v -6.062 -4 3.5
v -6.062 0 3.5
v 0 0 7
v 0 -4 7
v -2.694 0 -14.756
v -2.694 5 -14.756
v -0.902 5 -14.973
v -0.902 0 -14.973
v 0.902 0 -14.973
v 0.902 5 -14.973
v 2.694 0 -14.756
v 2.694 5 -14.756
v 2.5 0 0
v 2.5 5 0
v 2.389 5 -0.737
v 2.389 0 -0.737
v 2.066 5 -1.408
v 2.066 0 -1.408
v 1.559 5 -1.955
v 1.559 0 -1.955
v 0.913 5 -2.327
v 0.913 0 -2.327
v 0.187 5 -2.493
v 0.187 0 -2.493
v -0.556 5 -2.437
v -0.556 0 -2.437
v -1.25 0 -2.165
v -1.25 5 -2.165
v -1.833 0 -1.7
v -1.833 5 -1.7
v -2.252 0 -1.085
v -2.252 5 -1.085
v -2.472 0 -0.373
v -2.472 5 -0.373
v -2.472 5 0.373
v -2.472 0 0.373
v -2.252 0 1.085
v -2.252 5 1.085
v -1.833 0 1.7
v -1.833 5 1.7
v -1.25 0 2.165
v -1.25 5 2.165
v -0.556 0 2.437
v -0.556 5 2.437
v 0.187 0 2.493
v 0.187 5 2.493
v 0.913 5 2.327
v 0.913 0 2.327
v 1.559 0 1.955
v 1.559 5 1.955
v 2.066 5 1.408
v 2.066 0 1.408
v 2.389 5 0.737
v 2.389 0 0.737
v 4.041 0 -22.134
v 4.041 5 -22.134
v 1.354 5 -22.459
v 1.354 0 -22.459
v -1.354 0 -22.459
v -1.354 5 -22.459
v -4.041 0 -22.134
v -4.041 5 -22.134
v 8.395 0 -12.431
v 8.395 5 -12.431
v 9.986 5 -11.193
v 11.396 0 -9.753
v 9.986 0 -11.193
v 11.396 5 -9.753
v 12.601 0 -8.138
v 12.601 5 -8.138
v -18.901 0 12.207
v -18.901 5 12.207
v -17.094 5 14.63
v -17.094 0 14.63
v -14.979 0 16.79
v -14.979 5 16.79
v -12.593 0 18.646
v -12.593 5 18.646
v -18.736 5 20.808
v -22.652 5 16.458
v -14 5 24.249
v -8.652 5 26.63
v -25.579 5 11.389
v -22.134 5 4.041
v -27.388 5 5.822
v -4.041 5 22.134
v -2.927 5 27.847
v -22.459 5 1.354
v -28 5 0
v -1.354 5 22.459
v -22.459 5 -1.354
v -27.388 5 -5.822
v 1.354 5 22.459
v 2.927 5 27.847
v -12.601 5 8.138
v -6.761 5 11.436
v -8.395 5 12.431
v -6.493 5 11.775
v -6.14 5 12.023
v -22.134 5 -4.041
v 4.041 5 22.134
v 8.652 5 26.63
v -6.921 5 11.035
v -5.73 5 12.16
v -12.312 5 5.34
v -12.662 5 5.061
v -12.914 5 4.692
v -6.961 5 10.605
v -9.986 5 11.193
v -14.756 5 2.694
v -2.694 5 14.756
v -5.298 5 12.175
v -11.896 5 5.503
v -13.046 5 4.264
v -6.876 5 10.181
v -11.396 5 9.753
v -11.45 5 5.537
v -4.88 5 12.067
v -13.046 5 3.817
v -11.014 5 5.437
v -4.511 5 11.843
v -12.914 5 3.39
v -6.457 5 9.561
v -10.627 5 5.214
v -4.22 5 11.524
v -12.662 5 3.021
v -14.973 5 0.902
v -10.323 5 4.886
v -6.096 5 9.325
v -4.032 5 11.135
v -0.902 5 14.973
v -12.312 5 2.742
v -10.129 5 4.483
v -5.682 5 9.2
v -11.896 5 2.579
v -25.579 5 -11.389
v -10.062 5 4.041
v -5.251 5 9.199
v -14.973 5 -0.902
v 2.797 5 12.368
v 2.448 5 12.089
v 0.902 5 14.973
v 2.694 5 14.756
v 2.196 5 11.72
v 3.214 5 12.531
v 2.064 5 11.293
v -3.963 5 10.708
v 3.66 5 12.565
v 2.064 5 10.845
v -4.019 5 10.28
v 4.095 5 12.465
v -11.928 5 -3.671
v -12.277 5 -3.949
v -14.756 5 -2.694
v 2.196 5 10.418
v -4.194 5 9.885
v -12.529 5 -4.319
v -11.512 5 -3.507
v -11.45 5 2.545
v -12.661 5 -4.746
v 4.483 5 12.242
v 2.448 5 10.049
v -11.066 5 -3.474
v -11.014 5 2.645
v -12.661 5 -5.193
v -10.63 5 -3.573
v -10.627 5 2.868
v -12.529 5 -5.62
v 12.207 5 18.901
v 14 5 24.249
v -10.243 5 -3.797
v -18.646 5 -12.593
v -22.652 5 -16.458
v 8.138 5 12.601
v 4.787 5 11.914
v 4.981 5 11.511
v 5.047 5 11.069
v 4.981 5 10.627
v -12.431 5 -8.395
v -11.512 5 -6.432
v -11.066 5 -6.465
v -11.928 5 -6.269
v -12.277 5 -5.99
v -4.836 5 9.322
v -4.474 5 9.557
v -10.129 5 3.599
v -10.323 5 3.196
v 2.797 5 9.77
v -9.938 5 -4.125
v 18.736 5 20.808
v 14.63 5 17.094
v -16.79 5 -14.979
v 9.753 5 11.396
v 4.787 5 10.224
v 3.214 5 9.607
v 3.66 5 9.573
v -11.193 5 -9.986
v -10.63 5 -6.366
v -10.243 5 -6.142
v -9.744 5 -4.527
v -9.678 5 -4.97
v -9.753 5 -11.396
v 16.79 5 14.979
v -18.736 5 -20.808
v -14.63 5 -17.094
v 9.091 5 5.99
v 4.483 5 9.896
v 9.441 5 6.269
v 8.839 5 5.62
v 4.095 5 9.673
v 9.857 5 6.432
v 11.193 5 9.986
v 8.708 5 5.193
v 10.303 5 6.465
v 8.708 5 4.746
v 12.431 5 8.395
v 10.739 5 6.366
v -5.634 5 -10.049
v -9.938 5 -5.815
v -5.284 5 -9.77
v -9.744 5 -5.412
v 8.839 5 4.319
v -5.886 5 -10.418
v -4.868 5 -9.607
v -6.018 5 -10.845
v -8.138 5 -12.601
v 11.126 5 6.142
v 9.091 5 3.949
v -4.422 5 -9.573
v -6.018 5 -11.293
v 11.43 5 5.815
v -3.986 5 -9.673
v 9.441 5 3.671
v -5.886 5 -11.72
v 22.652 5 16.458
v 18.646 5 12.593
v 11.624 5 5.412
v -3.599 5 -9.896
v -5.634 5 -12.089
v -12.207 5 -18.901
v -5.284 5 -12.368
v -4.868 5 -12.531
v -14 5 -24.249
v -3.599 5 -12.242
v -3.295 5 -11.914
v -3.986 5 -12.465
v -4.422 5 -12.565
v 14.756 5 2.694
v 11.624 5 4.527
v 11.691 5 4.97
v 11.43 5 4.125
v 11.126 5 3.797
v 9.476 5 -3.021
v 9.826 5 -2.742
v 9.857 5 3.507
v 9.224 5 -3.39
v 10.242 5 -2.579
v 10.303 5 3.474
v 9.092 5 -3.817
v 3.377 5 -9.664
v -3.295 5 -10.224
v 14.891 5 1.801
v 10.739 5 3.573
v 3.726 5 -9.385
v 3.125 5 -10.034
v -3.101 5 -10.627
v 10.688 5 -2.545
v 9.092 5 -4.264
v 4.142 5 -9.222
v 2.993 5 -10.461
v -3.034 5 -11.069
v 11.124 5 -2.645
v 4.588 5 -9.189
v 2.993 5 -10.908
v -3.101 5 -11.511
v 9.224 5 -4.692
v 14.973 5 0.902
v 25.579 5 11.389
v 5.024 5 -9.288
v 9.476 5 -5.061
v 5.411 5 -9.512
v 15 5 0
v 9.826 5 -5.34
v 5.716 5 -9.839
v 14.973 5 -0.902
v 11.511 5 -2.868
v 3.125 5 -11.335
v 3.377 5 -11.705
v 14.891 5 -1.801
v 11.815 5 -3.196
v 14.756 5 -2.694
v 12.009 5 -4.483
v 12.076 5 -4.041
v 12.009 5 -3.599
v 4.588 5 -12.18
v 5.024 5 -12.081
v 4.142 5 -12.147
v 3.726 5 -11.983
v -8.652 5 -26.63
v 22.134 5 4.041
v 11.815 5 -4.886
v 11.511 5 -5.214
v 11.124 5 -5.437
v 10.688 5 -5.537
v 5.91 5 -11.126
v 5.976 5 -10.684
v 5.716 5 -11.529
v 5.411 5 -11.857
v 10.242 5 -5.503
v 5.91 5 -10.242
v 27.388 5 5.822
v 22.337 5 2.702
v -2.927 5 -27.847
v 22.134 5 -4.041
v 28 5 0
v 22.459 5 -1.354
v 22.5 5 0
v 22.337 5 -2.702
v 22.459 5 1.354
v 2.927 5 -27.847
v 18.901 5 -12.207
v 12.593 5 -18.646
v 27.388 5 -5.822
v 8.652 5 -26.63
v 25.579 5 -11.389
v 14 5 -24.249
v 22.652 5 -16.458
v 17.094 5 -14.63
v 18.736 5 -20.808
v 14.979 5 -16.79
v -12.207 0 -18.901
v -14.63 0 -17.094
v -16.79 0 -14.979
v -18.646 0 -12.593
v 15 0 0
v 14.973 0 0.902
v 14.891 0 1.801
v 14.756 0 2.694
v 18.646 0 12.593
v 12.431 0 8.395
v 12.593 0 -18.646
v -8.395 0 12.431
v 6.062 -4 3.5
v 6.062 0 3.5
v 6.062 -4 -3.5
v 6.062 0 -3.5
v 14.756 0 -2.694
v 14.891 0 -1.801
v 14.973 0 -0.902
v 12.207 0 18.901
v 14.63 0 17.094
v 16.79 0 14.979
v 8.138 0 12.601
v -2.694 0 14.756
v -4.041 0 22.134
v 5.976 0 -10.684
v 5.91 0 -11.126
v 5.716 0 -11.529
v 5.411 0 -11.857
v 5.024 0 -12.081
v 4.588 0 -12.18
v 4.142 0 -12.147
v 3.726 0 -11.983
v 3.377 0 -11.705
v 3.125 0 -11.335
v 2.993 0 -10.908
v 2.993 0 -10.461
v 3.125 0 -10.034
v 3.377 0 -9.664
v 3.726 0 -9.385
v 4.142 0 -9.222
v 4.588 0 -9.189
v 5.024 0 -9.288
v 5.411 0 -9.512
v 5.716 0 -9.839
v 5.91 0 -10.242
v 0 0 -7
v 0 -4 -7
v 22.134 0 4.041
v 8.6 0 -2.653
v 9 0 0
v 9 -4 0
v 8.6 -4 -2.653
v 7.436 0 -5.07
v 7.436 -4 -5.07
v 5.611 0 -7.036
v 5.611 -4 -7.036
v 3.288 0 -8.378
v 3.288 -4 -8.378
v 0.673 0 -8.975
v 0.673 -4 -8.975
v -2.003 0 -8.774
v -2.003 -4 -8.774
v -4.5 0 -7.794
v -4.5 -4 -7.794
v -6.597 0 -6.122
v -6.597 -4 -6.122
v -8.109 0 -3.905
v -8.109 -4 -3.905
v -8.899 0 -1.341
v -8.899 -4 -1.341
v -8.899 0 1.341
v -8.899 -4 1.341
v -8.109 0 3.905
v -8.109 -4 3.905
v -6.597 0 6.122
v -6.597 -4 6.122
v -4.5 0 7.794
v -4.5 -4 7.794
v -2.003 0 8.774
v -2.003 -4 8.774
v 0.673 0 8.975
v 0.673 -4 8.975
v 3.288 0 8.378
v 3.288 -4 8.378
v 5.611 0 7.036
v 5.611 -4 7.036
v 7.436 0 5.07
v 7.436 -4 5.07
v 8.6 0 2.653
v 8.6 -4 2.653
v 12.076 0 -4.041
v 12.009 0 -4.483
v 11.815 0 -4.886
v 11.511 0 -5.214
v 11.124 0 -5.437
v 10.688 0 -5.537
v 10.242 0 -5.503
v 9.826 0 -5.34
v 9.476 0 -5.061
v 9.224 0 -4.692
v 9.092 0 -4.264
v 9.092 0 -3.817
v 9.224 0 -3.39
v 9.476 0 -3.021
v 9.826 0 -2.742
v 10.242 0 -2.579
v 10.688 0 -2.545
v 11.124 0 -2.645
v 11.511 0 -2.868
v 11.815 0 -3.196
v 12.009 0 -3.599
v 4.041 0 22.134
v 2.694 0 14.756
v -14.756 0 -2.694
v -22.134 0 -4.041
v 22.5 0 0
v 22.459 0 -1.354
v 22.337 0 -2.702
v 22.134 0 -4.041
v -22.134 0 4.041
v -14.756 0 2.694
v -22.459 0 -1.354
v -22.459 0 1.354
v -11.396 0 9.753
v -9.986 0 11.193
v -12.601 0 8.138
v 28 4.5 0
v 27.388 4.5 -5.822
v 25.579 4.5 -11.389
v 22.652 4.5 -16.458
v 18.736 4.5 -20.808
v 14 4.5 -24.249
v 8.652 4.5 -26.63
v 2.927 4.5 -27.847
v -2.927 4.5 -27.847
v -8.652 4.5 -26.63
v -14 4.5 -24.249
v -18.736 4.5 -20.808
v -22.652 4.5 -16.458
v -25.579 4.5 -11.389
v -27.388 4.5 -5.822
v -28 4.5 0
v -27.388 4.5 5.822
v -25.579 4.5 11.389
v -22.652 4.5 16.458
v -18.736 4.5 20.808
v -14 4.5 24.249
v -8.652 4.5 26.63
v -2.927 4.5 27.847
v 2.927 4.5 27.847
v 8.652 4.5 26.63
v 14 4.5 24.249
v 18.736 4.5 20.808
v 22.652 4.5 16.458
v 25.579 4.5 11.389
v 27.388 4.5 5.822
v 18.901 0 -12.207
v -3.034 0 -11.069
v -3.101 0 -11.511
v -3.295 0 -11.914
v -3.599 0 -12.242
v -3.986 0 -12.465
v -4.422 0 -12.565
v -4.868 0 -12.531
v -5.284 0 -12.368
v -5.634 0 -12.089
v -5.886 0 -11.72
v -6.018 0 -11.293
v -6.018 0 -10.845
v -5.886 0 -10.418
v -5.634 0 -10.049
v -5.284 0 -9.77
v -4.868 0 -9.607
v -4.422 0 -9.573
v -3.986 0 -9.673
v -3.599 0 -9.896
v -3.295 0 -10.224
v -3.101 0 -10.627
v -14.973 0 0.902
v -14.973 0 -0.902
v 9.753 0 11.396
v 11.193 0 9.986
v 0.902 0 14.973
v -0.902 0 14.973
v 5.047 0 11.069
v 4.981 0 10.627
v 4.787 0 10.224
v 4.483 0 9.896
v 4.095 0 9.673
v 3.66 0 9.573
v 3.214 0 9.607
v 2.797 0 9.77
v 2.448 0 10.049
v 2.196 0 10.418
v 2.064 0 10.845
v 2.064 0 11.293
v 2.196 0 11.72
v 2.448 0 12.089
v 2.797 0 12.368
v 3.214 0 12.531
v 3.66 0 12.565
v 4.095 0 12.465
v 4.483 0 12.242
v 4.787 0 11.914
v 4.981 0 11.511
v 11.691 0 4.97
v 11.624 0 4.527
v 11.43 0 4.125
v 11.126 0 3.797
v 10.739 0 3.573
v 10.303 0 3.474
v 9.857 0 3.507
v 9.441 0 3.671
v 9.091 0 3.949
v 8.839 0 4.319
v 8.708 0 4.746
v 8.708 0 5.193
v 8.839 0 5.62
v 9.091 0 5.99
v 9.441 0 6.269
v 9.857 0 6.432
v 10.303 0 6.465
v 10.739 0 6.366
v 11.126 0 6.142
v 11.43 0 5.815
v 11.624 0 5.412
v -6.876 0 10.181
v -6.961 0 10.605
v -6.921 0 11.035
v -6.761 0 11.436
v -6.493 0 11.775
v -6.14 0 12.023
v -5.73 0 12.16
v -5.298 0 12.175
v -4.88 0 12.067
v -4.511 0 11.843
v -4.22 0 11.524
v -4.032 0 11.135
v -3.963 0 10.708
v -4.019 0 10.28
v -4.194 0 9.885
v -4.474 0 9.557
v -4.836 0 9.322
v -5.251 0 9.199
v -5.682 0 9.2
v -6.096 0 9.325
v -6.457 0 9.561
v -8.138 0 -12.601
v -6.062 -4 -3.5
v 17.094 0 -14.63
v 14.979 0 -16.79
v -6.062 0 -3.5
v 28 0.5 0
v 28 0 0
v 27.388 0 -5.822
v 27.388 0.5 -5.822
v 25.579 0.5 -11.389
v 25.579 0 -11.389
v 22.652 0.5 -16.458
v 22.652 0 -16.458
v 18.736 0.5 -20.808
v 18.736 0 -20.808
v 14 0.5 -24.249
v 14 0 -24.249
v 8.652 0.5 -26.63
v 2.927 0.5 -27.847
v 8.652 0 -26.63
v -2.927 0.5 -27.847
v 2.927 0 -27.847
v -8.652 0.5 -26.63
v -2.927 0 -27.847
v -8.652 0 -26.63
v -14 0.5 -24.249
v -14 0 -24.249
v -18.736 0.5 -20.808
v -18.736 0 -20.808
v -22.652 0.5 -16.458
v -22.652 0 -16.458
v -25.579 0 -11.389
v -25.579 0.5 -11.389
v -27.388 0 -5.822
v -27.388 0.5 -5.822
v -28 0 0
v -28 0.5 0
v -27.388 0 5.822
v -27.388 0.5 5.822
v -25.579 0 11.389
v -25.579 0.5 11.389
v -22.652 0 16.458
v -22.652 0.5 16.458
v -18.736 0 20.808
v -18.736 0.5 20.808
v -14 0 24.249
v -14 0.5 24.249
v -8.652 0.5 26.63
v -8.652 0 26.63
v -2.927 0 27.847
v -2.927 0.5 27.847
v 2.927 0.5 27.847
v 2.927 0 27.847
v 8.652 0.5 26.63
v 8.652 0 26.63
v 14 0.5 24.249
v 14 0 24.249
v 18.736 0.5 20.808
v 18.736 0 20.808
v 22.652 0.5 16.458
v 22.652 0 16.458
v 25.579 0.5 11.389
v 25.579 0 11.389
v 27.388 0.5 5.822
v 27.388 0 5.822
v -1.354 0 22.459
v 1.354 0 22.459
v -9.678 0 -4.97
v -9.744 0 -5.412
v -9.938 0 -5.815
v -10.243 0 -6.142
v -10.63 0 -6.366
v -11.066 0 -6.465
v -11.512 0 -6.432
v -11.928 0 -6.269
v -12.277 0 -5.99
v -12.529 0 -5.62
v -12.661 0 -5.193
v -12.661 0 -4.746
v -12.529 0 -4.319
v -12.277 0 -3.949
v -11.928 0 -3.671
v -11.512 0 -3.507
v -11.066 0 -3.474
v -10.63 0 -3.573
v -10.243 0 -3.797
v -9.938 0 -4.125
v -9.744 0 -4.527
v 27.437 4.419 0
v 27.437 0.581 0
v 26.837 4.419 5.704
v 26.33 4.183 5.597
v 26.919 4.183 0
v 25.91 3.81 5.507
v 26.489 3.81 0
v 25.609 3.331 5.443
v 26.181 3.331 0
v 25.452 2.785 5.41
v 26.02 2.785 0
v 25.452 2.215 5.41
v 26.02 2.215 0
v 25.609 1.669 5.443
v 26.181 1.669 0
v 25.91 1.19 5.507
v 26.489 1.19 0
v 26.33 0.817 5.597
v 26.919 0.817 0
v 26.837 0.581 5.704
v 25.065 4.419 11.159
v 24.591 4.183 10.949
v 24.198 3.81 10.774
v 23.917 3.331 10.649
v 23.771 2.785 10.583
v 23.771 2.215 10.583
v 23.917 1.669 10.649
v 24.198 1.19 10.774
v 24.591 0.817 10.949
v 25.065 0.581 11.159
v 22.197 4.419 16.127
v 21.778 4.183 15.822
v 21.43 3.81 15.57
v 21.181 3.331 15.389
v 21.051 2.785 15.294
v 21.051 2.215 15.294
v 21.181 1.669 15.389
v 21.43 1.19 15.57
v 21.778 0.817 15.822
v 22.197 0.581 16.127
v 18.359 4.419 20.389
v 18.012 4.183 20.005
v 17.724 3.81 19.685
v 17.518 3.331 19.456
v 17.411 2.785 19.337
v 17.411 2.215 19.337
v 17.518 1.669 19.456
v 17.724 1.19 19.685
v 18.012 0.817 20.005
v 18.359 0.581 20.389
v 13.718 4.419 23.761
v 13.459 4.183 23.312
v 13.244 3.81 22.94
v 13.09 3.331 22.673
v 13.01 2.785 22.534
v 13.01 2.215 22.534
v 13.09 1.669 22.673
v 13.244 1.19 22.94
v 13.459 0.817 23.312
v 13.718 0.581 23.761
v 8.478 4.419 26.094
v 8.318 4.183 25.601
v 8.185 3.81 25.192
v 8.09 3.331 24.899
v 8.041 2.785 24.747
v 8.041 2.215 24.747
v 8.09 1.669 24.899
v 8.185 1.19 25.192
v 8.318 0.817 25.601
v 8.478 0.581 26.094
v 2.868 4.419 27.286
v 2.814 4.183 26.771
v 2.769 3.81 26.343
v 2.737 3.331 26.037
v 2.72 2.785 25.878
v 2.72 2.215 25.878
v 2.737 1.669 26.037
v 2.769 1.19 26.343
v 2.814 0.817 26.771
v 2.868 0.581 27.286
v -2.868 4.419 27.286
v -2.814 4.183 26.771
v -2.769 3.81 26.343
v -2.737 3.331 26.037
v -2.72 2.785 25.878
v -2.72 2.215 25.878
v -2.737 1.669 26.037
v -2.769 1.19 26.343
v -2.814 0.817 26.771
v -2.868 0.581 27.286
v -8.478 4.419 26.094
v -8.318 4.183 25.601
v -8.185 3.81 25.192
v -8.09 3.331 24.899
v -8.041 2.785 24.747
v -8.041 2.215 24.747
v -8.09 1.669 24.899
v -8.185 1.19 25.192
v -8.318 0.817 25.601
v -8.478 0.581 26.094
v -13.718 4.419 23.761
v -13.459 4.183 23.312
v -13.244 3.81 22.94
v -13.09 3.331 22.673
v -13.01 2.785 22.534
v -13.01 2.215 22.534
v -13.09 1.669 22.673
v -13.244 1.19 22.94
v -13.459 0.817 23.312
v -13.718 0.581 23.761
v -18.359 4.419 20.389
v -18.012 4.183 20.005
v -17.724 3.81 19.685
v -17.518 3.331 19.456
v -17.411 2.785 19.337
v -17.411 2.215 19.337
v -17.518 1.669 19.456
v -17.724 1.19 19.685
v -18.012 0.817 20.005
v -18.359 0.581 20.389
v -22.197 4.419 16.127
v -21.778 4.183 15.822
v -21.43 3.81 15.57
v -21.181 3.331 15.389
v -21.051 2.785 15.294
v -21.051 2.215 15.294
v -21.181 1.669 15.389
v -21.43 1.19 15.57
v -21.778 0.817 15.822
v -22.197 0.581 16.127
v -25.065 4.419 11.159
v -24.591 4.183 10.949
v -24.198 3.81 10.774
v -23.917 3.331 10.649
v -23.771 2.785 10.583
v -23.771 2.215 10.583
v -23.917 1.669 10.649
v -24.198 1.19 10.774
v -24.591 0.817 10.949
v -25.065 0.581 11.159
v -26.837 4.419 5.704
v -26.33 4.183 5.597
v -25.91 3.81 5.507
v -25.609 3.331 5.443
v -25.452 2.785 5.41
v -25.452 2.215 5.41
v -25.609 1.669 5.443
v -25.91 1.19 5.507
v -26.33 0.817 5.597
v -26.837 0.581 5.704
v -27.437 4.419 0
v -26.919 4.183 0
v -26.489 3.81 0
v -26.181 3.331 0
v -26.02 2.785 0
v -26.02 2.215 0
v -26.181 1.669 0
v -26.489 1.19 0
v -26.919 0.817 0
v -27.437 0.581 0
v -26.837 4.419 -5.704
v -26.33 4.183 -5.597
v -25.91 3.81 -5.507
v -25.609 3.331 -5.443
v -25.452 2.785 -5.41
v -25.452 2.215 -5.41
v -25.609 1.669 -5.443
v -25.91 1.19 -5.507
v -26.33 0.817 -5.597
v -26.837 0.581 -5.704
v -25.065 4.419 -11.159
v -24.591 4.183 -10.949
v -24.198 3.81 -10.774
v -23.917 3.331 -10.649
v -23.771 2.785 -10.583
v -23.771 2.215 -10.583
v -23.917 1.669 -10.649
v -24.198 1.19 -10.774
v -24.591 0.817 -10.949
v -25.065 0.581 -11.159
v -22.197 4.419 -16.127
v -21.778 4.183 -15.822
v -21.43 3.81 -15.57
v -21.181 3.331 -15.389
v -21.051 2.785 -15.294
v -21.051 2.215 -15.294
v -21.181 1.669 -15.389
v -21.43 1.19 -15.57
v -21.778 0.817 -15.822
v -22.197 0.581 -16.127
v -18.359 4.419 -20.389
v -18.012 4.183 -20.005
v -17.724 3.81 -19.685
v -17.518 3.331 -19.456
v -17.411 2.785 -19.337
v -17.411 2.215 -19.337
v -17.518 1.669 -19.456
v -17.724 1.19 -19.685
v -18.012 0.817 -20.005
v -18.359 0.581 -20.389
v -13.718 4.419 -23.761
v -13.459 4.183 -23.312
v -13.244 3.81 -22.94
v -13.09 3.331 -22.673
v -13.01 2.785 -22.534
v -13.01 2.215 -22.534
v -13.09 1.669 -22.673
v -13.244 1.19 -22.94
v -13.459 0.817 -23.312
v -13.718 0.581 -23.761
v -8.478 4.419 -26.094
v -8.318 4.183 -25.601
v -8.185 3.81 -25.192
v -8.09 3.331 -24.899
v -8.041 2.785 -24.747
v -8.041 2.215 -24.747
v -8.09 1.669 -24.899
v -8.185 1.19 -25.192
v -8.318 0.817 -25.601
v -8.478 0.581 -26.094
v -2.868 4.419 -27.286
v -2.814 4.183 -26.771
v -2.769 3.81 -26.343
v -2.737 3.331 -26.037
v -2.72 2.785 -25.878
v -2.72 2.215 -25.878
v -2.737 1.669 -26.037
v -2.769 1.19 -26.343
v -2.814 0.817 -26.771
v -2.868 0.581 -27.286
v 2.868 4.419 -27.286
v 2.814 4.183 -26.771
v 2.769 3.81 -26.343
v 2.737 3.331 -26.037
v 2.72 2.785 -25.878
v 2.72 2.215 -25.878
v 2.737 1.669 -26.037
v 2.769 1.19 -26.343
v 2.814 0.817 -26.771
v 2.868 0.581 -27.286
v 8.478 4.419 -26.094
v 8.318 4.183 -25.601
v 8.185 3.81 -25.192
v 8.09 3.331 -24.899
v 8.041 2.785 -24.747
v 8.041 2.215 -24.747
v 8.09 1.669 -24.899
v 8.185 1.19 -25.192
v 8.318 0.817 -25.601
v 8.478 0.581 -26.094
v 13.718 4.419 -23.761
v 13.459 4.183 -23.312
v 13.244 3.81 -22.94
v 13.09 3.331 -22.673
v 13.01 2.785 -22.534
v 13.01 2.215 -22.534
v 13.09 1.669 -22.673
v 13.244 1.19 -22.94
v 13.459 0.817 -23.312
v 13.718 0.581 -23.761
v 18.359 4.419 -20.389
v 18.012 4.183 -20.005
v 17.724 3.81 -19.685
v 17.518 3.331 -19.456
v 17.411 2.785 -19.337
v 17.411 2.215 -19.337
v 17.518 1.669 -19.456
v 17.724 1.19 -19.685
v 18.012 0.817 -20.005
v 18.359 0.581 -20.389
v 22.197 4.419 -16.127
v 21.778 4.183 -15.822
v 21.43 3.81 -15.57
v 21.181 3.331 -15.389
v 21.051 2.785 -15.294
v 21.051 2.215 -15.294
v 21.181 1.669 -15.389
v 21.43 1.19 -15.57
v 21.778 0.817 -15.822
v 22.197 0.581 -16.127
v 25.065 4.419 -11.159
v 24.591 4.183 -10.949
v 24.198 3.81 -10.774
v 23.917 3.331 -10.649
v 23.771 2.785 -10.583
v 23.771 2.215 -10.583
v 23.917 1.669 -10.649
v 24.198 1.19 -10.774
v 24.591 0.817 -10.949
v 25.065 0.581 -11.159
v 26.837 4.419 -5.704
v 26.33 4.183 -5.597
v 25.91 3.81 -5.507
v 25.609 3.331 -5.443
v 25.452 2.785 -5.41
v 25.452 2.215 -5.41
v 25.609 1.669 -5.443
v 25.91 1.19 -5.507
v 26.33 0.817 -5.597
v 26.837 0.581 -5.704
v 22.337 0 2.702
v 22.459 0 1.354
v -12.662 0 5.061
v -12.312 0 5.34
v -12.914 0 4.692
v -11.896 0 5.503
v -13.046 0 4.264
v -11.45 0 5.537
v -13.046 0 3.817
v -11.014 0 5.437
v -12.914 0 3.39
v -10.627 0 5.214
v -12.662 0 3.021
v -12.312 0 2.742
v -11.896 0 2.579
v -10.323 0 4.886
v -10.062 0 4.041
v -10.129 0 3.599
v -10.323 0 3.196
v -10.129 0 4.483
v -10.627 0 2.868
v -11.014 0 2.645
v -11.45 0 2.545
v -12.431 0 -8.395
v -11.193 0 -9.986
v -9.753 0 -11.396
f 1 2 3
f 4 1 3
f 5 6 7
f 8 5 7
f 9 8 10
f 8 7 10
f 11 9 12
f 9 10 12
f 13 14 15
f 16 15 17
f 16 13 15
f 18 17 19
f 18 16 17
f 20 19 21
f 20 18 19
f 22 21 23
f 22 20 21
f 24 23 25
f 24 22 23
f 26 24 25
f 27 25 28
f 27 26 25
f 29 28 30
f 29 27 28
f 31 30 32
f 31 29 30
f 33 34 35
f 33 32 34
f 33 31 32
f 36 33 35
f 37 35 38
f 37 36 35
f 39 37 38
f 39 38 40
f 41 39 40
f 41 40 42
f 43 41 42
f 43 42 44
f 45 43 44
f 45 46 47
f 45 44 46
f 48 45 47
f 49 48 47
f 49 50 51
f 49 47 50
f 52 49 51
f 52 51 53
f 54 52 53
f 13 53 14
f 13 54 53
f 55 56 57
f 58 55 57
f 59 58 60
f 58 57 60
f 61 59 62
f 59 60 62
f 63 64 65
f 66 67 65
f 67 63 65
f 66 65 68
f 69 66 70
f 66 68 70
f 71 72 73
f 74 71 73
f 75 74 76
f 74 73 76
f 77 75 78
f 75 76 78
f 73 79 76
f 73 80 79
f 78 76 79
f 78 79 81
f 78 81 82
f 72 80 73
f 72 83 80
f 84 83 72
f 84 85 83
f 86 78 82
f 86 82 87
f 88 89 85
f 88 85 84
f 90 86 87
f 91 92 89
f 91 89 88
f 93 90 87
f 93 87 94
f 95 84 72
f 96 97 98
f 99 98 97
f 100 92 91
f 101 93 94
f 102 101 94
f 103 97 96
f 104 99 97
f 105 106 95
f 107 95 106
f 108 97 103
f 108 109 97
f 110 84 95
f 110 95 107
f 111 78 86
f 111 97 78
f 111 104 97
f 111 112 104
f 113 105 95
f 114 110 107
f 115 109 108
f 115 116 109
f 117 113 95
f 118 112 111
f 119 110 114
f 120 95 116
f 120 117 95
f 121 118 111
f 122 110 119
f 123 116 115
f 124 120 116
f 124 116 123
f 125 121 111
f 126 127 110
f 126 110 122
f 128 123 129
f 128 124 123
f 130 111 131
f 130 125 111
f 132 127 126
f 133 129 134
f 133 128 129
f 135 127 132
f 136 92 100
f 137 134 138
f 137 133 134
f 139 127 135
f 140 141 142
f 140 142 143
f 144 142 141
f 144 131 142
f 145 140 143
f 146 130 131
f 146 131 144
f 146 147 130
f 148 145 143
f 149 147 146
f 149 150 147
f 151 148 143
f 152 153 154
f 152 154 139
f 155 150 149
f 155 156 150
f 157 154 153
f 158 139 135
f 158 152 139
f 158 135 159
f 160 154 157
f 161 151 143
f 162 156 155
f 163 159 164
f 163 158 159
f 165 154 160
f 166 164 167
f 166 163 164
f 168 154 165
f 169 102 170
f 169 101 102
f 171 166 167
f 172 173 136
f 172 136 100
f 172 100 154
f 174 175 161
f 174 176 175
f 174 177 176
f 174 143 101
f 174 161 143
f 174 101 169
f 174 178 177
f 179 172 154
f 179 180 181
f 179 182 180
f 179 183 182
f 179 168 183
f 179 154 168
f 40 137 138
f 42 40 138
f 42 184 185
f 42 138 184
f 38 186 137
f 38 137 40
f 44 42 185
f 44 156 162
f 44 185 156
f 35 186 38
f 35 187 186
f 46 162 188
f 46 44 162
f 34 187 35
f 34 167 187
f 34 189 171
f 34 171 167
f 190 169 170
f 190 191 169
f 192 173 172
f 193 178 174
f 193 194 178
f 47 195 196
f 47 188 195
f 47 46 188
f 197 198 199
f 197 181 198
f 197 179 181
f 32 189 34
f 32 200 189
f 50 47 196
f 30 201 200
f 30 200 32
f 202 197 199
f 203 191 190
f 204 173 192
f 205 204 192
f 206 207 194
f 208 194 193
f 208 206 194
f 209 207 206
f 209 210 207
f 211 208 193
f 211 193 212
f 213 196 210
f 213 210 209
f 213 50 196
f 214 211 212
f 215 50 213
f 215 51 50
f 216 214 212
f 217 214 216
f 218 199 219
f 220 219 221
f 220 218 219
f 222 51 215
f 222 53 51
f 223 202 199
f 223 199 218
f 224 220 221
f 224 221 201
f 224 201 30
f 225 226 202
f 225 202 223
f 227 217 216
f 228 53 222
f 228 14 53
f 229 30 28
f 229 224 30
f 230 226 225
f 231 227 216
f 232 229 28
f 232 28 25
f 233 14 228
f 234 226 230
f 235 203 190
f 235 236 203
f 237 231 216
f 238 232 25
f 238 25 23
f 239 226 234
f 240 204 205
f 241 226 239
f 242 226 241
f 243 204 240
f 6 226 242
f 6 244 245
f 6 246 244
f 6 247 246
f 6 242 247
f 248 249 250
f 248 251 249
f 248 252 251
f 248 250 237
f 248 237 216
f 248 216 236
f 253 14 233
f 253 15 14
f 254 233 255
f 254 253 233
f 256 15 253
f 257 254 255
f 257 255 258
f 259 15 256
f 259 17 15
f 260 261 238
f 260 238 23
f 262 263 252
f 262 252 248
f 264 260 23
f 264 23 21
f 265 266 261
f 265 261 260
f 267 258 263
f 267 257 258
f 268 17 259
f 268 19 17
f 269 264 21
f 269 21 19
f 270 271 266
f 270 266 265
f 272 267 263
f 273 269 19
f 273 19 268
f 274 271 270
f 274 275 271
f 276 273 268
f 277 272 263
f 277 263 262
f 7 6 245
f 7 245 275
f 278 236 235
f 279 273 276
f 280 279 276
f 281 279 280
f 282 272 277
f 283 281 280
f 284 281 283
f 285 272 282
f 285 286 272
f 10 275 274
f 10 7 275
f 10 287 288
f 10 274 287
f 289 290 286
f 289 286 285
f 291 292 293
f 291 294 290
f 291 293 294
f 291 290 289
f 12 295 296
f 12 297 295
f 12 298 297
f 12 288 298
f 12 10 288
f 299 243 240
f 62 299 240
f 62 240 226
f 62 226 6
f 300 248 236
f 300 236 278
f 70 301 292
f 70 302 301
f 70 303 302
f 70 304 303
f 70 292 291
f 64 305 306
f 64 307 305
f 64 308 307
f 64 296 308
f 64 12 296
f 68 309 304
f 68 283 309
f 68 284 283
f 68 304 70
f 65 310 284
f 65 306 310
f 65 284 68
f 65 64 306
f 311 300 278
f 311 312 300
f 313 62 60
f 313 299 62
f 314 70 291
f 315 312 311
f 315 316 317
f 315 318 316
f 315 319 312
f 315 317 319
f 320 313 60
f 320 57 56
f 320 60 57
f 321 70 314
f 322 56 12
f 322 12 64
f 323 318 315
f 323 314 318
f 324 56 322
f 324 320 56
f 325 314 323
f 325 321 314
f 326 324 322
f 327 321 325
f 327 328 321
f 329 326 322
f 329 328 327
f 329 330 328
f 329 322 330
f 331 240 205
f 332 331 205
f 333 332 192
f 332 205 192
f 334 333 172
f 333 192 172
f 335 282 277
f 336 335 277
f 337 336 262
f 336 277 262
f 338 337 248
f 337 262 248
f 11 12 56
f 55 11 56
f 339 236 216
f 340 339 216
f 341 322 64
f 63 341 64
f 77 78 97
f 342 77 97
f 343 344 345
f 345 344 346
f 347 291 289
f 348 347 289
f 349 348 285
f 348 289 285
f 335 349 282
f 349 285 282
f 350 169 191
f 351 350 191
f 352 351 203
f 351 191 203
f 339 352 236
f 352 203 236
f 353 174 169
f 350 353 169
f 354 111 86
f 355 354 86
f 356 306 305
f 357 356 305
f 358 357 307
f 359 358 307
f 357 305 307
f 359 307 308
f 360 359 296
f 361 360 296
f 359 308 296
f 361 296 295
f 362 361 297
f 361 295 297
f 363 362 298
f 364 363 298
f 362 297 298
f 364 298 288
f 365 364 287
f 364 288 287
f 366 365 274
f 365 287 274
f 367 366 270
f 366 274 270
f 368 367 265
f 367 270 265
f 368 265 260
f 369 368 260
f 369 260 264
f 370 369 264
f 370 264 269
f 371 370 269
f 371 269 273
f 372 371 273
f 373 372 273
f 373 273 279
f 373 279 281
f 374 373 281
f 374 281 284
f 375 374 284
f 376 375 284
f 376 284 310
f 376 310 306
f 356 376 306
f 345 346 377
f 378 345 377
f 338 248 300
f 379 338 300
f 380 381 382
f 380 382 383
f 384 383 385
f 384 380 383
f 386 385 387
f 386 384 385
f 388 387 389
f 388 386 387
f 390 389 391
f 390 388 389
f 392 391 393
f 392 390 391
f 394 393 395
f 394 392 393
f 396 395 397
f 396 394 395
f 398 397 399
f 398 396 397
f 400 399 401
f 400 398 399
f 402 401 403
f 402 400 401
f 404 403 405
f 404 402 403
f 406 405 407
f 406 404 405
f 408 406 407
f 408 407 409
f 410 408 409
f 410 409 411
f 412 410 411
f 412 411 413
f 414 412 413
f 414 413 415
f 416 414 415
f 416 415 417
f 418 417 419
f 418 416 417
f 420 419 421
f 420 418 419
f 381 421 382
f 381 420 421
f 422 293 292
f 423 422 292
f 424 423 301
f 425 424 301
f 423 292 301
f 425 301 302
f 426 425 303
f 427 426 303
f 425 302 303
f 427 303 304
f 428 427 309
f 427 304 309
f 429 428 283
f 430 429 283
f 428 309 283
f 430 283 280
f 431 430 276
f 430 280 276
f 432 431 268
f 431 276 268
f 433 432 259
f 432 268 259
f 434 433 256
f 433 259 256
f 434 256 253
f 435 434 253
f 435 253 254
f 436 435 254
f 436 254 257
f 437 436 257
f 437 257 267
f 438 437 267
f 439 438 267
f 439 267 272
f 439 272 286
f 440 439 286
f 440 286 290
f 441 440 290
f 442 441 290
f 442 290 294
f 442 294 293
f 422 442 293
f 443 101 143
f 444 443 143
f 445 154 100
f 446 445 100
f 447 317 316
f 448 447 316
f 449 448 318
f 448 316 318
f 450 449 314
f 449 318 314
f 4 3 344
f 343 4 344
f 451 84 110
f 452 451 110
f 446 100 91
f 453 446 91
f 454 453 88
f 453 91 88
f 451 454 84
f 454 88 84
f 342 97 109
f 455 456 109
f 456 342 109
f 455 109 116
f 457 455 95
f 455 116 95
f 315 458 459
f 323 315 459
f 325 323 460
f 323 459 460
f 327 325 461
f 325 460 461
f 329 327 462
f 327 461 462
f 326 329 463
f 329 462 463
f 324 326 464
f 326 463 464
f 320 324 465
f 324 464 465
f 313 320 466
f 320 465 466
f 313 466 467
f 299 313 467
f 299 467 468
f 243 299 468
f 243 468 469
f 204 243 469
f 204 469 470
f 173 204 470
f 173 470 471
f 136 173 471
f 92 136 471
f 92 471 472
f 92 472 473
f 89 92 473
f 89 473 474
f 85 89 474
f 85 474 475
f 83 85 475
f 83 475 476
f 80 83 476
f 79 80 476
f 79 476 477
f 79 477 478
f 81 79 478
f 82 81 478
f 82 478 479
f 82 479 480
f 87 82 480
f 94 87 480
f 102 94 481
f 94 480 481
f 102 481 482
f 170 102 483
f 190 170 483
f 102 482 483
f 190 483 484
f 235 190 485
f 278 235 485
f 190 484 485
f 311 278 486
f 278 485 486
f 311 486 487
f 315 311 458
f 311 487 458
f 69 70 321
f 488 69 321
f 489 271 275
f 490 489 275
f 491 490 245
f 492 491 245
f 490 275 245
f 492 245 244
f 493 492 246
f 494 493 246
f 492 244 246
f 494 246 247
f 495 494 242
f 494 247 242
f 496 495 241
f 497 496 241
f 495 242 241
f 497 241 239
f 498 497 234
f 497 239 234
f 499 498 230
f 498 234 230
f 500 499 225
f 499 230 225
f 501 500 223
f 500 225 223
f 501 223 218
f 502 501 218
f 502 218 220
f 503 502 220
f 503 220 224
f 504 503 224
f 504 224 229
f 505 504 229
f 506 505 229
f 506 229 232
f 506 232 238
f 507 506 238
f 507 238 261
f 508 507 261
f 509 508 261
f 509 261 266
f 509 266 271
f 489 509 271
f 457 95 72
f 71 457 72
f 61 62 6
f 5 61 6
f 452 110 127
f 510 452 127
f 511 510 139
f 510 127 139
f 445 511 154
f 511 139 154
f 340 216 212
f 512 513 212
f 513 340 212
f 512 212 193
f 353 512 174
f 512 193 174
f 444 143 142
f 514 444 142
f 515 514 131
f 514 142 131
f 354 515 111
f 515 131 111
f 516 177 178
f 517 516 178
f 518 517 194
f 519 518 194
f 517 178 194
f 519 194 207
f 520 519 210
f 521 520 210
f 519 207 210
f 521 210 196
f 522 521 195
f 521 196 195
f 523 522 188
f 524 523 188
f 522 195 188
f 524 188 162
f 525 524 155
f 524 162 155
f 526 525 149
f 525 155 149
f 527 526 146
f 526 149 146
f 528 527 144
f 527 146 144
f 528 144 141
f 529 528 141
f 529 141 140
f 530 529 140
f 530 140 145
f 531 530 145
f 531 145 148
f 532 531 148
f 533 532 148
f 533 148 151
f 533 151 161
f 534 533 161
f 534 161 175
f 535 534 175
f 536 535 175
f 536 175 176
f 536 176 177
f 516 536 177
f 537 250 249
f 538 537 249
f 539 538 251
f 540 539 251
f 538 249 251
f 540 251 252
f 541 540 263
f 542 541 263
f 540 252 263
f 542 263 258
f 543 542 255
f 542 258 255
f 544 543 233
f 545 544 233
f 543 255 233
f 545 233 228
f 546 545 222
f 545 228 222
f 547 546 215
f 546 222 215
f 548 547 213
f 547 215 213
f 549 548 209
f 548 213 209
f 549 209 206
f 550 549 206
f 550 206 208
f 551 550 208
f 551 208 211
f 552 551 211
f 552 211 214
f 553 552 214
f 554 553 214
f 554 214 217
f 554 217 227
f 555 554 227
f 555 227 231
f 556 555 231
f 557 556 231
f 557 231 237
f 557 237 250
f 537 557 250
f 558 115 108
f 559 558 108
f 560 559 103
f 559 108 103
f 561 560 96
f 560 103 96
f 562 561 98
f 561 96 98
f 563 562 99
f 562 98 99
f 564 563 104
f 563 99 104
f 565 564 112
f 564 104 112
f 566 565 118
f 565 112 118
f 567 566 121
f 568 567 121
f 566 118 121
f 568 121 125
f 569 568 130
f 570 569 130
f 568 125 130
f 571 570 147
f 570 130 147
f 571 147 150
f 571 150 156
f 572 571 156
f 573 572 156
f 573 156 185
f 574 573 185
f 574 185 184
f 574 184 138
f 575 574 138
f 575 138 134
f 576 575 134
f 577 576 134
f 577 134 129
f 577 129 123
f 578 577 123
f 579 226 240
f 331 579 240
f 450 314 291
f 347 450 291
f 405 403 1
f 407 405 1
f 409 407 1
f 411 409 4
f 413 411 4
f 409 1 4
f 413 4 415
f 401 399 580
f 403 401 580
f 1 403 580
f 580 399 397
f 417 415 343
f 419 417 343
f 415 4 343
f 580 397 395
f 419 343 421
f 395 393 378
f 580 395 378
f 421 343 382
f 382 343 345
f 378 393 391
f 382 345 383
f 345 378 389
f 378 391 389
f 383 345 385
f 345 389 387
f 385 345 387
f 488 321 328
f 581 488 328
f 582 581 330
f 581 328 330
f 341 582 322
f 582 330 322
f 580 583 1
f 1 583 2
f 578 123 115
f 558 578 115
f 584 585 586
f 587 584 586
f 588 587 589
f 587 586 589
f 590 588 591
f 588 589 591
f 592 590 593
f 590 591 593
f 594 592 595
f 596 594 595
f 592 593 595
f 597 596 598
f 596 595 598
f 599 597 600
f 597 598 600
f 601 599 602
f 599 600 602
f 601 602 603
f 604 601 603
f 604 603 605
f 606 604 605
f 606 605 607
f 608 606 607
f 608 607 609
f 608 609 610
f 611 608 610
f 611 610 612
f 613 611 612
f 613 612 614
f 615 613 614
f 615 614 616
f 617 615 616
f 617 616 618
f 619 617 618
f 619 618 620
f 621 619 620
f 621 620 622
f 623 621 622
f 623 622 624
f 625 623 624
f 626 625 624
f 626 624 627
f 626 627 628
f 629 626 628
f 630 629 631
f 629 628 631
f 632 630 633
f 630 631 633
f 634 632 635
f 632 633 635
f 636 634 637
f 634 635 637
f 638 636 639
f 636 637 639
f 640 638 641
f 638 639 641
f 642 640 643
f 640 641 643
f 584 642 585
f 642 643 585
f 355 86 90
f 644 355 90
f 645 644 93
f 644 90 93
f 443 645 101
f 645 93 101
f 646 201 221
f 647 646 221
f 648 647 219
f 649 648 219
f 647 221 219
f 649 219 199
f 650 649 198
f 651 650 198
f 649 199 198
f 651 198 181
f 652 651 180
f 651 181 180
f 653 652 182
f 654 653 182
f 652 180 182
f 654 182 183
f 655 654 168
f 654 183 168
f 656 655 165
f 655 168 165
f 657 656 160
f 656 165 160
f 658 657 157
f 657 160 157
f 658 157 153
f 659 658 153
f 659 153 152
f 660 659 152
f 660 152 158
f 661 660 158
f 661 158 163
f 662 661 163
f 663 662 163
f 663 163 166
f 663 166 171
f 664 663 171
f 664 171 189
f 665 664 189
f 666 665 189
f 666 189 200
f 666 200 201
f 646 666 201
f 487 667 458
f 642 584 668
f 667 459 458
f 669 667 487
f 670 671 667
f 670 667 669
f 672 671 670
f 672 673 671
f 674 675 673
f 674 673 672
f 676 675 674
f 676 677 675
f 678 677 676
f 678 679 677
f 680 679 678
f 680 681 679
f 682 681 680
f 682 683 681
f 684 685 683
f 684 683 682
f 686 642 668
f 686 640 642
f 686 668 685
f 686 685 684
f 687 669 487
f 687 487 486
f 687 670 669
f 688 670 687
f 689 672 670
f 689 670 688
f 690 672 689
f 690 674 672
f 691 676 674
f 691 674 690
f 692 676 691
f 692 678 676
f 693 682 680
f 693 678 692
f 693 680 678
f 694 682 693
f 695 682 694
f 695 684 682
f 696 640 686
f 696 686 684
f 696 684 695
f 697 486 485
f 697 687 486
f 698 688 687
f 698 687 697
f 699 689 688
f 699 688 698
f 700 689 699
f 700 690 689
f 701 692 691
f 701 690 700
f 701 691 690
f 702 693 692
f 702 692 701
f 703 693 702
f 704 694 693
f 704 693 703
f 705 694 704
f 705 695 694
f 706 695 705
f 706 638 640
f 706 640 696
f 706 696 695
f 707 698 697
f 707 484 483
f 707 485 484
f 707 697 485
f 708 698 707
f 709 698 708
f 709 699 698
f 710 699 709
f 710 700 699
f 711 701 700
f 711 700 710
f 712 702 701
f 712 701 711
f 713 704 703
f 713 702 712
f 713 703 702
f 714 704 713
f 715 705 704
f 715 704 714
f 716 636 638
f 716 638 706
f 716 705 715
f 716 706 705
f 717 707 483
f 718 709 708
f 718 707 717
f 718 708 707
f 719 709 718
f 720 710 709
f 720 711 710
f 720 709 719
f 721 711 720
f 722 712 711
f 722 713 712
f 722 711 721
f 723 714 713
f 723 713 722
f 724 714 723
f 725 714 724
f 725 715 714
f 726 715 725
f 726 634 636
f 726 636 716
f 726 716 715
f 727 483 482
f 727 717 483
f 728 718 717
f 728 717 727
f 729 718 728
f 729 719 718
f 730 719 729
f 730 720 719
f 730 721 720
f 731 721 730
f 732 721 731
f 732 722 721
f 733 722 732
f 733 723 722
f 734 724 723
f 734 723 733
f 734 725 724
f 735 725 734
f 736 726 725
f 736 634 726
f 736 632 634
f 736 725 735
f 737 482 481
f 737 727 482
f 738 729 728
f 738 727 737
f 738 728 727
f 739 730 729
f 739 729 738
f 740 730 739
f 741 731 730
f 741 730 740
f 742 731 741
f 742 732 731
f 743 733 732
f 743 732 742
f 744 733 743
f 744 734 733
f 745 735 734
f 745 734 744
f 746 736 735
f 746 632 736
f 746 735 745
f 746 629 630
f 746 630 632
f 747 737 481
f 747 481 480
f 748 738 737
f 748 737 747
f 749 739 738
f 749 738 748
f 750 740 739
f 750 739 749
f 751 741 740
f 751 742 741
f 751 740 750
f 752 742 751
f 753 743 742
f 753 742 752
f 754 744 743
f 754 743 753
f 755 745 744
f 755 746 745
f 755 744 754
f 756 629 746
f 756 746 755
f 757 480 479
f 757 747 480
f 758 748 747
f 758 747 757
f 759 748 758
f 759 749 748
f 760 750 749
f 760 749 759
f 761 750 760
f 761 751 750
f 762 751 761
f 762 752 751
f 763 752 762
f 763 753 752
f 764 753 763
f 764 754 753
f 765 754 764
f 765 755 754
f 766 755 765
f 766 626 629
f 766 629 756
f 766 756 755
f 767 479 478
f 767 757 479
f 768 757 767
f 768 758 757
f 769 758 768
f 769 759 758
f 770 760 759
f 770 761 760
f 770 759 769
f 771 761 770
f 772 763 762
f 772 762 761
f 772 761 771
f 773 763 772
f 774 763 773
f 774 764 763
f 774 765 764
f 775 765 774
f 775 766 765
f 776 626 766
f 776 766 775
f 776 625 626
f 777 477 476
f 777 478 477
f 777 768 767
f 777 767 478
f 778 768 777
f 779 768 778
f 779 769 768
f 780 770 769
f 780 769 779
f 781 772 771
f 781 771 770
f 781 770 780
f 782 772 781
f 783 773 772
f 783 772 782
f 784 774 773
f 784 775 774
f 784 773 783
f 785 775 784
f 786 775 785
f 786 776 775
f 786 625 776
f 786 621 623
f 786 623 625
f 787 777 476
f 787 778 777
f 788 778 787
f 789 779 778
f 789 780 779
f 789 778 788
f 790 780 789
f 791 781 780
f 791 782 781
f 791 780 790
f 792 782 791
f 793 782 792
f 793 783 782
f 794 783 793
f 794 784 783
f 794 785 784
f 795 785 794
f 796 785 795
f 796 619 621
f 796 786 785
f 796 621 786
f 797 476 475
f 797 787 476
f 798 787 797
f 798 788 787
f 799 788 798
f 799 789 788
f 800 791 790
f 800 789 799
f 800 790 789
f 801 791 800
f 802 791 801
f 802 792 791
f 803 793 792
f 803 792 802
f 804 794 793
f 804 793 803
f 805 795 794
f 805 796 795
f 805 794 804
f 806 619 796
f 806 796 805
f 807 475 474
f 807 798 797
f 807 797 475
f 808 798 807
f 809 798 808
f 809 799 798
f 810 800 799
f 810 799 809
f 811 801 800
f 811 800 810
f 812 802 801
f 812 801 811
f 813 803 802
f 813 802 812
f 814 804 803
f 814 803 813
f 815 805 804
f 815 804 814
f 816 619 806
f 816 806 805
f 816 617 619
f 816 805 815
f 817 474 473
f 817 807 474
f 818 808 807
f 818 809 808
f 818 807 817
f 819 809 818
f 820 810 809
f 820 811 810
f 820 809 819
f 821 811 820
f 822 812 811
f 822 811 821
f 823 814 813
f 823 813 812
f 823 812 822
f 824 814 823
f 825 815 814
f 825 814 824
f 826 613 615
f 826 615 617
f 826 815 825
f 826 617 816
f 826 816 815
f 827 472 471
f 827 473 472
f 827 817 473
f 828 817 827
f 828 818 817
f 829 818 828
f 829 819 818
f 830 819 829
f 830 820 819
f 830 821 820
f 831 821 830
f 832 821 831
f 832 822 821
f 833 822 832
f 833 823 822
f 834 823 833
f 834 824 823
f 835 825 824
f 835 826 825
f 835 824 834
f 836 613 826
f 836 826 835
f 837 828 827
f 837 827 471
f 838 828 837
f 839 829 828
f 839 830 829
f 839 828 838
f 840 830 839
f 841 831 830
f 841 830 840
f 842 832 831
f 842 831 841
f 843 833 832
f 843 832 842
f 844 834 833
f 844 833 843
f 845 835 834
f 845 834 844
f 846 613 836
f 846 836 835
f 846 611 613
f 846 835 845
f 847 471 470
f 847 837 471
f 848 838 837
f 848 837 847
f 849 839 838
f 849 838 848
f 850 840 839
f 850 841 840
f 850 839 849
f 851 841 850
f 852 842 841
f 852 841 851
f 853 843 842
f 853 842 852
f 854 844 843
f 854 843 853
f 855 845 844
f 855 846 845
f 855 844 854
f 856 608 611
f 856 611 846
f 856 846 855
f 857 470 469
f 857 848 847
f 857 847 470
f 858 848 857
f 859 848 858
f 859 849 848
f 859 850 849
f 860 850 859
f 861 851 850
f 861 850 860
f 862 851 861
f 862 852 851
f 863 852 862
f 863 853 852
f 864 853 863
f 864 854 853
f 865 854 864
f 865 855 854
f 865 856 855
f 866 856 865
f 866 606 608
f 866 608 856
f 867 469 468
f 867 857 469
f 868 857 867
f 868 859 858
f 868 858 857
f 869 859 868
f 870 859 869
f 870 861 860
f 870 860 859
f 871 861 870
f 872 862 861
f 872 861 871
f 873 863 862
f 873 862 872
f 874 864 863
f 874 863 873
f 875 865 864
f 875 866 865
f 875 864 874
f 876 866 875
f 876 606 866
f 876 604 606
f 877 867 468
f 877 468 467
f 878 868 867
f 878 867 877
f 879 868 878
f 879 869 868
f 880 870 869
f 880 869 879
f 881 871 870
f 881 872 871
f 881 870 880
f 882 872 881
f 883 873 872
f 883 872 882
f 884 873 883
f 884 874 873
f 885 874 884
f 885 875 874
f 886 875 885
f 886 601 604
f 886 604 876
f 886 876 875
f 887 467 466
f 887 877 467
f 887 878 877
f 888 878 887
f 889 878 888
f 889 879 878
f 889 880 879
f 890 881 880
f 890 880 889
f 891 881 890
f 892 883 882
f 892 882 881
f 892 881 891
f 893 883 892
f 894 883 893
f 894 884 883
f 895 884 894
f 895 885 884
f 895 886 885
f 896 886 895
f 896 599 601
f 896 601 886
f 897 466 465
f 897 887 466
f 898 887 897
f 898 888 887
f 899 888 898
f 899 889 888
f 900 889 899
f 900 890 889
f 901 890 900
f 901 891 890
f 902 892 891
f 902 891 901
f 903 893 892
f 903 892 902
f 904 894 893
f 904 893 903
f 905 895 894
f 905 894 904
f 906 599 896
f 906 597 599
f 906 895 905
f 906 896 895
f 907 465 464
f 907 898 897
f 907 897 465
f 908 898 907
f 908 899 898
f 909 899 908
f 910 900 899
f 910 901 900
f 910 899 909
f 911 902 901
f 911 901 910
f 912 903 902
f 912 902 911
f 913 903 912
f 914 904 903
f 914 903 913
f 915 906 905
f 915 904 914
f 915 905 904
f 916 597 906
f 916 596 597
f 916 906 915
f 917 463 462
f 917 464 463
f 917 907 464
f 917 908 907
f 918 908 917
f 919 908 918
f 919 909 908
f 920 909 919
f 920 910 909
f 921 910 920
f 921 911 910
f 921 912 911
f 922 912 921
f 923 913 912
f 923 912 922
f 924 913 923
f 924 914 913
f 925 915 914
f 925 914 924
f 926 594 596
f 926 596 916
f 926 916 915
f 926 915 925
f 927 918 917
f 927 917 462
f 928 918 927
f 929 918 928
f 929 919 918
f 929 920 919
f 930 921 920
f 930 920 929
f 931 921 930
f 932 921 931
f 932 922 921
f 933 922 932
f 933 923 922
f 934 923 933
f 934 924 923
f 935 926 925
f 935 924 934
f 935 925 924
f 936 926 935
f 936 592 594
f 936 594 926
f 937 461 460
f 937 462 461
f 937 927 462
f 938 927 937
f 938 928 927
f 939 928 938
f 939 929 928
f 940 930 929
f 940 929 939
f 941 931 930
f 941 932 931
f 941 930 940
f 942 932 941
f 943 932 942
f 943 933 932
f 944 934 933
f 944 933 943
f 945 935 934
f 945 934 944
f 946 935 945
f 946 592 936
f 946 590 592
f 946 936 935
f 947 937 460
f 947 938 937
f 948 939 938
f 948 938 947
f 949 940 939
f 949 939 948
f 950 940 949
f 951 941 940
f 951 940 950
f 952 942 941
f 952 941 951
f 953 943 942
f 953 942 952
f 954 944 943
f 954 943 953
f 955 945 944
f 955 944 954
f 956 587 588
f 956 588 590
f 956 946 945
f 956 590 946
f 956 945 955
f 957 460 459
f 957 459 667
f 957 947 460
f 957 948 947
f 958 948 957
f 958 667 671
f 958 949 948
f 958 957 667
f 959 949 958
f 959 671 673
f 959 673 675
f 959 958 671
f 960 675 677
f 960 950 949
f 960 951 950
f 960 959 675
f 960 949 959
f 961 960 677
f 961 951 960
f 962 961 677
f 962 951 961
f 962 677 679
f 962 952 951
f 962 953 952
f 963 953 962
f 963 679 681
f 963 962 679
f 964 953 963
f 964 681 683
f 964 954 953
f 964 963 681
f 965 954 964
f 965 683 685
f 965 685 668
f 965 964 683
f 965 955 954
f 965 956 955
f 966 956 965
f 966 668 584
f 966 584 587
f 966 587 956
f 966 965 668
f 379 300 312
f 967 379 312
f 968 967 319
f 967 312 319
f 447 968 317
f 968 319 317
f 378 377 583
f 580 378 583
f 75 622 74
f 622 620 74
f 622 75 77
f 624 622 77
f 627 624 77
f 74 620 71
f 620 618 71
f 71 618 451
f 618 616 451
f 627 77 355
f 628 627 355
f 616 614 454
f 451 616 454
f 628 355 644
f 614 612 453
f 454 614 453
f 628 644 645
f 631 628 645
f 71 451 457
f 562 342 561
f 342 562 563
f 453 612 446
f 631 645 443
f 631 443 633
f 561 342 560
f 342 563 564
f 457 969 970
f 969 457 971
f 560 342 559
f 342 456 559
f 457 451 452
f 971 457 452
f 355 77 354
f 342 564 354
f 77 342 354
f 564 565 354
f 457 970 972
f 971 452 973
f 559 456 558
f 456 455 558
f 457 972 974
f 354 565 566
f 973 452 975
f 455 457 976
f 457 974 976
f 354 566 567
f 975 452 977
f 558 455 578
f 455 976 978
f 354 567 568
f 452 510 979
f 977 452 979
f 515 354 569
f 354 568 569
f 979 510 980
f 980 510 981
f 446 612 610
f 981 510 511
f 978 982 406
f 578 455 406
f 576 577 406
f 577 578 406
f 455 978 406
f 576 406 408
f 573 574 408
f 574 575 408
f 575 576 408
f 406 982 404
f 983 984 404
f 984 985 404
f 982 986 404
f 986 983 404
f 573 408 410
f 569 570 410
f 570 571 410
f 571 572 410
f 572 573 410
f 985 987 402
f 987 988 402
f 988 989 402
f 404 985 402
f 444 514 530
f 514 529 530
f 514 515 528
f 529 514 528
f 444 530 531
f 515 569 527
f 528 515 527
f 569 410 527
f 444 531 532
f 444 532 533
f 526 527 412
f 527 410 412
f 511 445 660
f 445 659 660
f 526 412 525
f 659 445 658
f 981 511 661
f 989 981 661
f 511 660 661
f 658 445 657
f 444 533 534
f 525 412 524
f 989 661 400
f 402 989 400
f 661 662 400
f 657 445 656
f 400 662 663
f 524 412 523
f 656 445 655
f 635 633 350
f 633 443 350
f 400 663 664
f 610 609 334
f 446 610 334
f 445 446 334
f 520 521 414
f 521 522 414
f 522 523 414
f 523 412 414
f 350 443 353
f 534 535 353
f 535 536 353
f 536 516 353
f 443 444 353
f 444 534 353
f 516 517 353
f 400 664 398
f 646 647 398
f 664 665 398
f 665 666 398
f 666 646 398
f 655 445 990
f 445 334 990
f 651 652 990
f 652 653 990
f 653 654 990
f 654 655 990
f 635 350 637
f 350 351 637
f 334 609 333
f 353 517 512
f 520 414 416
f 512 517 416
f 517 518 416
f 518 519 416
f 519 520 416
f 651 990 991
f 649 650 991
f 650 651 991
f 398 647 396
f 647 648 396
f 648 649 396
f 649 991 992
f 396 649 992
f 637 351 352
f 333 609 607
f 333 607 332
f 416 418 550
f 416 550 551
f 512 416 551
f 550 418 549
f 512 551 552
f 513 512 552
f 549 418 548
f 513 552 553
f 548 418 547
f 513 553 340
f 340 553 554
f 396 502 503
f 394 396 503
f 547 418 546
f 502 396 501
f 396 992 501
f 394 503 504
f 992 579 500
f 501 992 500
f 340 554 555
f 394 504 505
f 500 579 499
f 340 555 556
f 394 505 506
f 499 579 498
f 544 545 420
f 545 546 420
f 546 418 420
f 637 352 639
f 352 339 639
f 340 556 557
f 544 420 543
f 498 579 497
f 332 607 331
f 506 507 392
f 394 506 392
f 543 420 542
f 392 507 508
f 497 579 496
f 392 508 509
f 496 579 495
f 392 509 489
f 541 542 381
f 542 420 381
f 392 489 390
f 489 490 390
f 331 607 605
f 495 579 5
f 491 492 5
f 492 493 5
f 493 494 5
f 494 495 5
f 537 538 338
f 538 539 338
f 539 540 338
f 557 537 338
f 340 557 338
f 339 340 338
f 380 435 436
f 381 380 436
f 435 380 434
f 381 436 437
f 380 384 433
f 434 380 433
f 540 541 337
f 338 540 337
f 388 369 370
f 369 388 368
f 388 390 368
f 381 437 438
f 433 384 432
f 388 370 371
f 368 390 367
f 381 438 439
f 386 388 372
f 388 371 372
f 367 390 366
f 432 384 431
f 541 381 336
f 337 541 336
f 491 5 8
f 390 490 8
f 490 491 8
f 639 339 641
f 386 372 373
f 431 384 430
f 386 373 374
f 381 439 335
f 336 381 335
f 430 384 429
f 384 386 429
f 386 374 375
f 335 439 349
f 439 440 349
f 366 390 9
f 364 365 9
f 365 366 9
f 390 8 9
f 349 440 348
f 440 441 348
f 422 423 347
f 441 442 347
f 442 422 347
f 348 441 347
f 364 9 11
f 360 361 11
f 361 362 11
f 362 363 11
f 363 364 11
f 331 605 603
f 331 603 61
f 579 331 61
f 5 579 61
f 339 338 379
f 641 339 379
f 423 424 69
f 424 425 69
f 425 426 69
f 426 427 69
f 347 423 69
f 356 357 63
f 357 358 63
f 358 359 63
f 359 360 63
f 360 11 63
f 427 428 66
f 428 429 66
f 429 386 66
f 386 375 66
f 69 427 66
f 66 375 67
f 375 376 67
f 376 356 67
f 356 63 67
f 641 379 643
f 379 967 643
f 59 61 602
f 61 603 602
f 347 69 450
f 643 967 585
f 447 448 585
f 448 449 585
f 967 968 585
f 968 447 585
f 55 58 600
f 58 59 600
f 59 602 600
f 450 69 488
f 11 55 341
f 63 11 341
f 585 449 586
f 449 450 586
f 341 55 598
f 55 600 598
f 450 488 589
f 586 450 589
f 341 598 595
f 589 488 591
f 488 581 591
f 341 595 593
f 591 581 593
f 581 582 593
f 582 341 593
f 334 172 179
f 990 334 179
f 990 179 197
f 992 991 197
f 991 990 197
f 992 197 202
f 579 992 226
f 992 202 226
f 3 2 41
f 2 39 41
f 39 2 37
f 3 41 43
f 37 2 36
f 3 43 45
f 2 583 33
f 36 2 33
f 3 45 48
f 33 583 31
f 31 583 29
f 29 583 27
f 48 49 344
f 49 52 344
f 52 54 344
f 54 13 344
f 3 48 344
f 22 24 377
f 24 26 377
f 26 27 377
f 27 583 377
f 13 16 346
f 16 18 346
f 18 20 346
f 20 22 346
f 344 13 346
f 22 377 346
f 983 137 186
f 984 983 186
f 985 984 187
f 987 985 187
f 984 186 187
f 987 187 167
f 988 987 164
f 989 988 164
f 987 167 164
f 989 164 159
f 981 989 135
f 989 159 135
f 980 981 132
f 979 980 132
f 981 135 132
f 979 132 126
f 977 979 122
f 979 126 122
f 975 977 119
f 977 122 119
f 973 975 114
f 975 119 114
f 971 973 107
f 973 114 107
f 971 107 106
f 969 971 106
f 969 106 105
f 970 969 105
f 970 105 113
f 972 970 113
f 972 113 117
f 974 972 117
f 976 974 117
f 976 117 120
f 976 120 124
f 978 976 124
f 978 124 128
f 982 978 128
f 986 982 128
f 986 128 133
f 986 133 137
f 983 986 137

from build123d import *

# Parameters (mm, degrees)
SKETCH6_R                = 28
BOSS_EXTRUDE3_DEPTH      = 5
CUT_EXTRUDE4_DEPTH       = 1
CUT_EXTRUDE4_DEPTH_BACK  = 6
SKETCH7_8_R              = 1.5
CUT_EXTRUDE5_DEPTH       = 1
CUT_EXTRUDE5_DEPTH_BACK  = 6
SKETCH10_R               = 2
SKETCH11_R               = 2.5
CUT_EXTRUDE14_DEPTH      = 6
CUT_EXTRUDE14_DEPTH_BACK = 5
SKETCH12_R               = 9
BOSS_EXTRUDE4_DEPTH      = 4


with BuildPart() as part:
    # Sketch6 → Boss-Extrude3 (new body)
    with BuildSketch(Plane(origin=(0, 0, 0), x_dir=(1, 0, 0), z_dir=(0, 1, 0))):
        Circle(SKETCH6_R)
    extrude(amount=BOSS_EXTRUDE3_DEPTH)

    # Sketch7 → Cut-Extrude4 (cut, two sides)
    with BuildSketch(Plane(origin=(0, 5, 0), x_dir=(1, 0, 0), z_dir=(0, 1, 0))) as cut_extrude4_sk:
        with BuildLine():
            Line((12.600595793, 8.137873534), (18.900893689, 12.206810302))
            ThreePointArc((18.900893689, 12.206810302), (16.072652831, 15.745470173), (12.592900123, 18.645880684))
            Line((12.592900123, 18.645880684), (8.395266749, 12.430587123))
            ThreePointArc((8.395266749, 12.430587123), (10.715101887, 10.496980115), (12.600595793, 8.137873534))
        make_face()
        with BuildLine():
            Line((2.693946551, 14.756105583), (4.040919826, 22.134158375))
            ThreePointArc((4.040919826, 22.134158375), (0, 22.5), (-4.040919826, 22.134158375))
            Line((-4.040919826, 22.134158375), (-2.693946551, 14.756105583))
            ThreePointArc((-2.693946551, 14.756105583), (0, 15), (2.693946551, 14.756105583))
        make_face()
        with BuildLine():
            Line((-8.137873534, 12.600595793), (-12.206810302, 18.900893689))
            ThreePointArc((-12.206810302, 18.900893689), (-15.745470173, 16.072652831), (-18.645880684, 12.592900123))
            Line((-18.645880684, 12.592900123), (-12.430587123, 8.395266749))
            ThreePointArc((-12.430587123, 8.395266749), (-10.496980115, 10.715101887), (-8.137873534, 12.600595793))
        make_face()
        with BuildLine():
            Line((-14.756105583, 2.693946551), (-22.134158375, 4.040919826))
            ThreePointArc((-22.134158375, 4.040919826), (-22.5, 0), (-22.134158375, -4.040919826))
            Line((-22.134158375, -4.040919826), (-14.756105583, -2.693946551))
            ThreePointArc((-14.756105583, -2.693946551), (-15, 0), (-14.756105583, 2.693946551))
        make_face()
        with BuildLine():
            ThreePointArc((-18.900893689, -12.206810302), (-16.072652831, -15.745470173), (-12.592900123, -18.645880684))
            Line((-12.592900123, -18.645880684), (-8.395266749, -12.430587123))
            ThreePointArc((-8.395266749, -12.430587123), (-10.715101887, -10.496980115), (-12.600595793, -8.137873534))
            Line((-12.600595793, -8.137873534), (-18.900893689, -12.206810302))
        make_face()
        with BuildLine():
            ThreePointArc((-4.040919826, -22.134158375), (0, -22.5), (4.040919826, -22.134158375))
            Line((4.040919826, -22.134158375), (2.693946551, -14.756105583))
            ThreePointArc((2.693946551, -14.756105583), (0, -15), (-2.693946551, -14.756105583))
            Line((-2.693946551, -14.756105583), (-4.040919826, -22.134158375))
        make_face()
        with BuildLine():
            ThreePointArc((12.206810302, -18.900893689), (15.745470173, -16.072652831), (18.645880684, -12.592900123))
            Line((18.645880684, -12.592900123), (12.430587123, -8.395266749))
            ThreePointArc((12.430587123, -8.395266749), (10.496980115, -10.715101887), (8.137873534, -12.600595793))
            Line((8.137873534, -12.600595793), (12.206810302, -18.900893689))
        make_face()
        with BuildLine():
            ThreePointArc((22.5, 0), (22.408352945, 2.028723314), (22.134158375, 4.040919826))
            Line((22.134158375, 4.040919826), (14.756105583, 2.693946551))
            ThreePointArc((14.756105583, 2.693946551), (14.938901963, 1.352482209), (15, 0))
            ThreePointArc((15, 0), (14.938901963, -1.352482209), (14.756105583, -2.693946551))
            Line((14.756105583, -2.693946551), (22.134158375, -4.040919826))
            ThreePointArc((22.134158375, -4.040919826), (22.408352945, -2.028723314), (22.5, 0))
        make_face()
    extrude(amount=CUT_EXTRUDE4_DEPTH, mode=Mode.SUBTRACT)
    extrude(cut_extrude4_sk.sketch, amount=-CUT_EXTRUDE4_DEPTH_BACK, mode=Mode.SUBTRACT)

    # Sketch7<8> → Cut-Extrude5 (cut, two sides)
    with BuildSketch(Plane(origin=(0, 5, 0), x_dir=(1, 0, 0), z_dir=(0, 1, 0))) as cut_extrude5_sk:
        with Locations((10.5755737, 4.040919826)):
            Circle(SKETCH7_8_R)
        with Locations((10.190896389, -4.969613007)):
            Circle(SKETCH7_8_R)
        with Locations((4.476172766, 10.68433663)):
            Circle(SKETCH7_8_R)
        with Locations((3.547479586, -11.06901394)):
            Circle(SKETCH7_8_R)
        with Locations((-4.534360067, 11.06901394)):
            Circle(SKETCH7_8_R)
        with BuildLine():
            ThreePointArc((-6.876220335, -10.181386548), (-4.219994535, -11.523863304), (-6.457430859, -9.561299157))
            Line((-6.457430859, -9.561299157), (-6.876220335, -10.181386548))
        make_face()
        with Locations((-11.17777687, 4.969613007)):
            Circle(SKETCH7_8_R)
        with Locations((-11.562454181, -4.040919826)):
            Circle(SKETCH7_8_R)
    extrude(amount=CUT_EXTRUDE5_DEPTH, mode=Mode.SUBTRACT)
    extrude(cut_extrude5_sk.sketch, amount=-CUT_EXTRUDE5_DEPTH_BACK, mode=Mode.SUBTRACT)

    # Sketch10 → Cut-Revolve1 (revolve, cut)
    with BuildSketch(Plane.XY):
        with Locations((28, 2.5)):
            Circle(SKETCH10_R)
    revolve(axis=Axis((0, 40.614262211, 0), (0, -1, 0)), mode=Mode.SUBTRACT)

    # Sketch11 → Cut-Extrude14 (cut, two sides)
    with BuildSketch(Plane(origin=(0, 0, 0), x_dir=(1, 0, 0), z_dir=(0, 1, 0))) as cut_extrude14_sk:
        Circle(SKETCH11_R)
    extrude(amount=CUT_EXTRUDE14_DEPTH, mode=Mode.SUBTRACT)
    extrude(cut_extrude14_sk.sketch, amount=-CUT_EXTRUDE14_DEPTH_BACK, mode=Mode.SUBTRACT)

    # Sketch12 → Boss-Extrude4 (add)
    with BuildSketch(Plane(origin=(0, 0, 0), x_dir=(1, 0, 0), z_dir=(0, 1, 0))):
        Circle(SKETCH12_R)
        Polygon((0, 7), (-6.062177826, 3.5), (-6.062177826, -3.5), (0, -7), (6.062177826, -3.5), (6.062177826, 3.5), align=None, mode=Mode.SUBTRACT)
    extrude(amount=-BOSS_EXTRUDE4_DEPTH)


solid = part.part
